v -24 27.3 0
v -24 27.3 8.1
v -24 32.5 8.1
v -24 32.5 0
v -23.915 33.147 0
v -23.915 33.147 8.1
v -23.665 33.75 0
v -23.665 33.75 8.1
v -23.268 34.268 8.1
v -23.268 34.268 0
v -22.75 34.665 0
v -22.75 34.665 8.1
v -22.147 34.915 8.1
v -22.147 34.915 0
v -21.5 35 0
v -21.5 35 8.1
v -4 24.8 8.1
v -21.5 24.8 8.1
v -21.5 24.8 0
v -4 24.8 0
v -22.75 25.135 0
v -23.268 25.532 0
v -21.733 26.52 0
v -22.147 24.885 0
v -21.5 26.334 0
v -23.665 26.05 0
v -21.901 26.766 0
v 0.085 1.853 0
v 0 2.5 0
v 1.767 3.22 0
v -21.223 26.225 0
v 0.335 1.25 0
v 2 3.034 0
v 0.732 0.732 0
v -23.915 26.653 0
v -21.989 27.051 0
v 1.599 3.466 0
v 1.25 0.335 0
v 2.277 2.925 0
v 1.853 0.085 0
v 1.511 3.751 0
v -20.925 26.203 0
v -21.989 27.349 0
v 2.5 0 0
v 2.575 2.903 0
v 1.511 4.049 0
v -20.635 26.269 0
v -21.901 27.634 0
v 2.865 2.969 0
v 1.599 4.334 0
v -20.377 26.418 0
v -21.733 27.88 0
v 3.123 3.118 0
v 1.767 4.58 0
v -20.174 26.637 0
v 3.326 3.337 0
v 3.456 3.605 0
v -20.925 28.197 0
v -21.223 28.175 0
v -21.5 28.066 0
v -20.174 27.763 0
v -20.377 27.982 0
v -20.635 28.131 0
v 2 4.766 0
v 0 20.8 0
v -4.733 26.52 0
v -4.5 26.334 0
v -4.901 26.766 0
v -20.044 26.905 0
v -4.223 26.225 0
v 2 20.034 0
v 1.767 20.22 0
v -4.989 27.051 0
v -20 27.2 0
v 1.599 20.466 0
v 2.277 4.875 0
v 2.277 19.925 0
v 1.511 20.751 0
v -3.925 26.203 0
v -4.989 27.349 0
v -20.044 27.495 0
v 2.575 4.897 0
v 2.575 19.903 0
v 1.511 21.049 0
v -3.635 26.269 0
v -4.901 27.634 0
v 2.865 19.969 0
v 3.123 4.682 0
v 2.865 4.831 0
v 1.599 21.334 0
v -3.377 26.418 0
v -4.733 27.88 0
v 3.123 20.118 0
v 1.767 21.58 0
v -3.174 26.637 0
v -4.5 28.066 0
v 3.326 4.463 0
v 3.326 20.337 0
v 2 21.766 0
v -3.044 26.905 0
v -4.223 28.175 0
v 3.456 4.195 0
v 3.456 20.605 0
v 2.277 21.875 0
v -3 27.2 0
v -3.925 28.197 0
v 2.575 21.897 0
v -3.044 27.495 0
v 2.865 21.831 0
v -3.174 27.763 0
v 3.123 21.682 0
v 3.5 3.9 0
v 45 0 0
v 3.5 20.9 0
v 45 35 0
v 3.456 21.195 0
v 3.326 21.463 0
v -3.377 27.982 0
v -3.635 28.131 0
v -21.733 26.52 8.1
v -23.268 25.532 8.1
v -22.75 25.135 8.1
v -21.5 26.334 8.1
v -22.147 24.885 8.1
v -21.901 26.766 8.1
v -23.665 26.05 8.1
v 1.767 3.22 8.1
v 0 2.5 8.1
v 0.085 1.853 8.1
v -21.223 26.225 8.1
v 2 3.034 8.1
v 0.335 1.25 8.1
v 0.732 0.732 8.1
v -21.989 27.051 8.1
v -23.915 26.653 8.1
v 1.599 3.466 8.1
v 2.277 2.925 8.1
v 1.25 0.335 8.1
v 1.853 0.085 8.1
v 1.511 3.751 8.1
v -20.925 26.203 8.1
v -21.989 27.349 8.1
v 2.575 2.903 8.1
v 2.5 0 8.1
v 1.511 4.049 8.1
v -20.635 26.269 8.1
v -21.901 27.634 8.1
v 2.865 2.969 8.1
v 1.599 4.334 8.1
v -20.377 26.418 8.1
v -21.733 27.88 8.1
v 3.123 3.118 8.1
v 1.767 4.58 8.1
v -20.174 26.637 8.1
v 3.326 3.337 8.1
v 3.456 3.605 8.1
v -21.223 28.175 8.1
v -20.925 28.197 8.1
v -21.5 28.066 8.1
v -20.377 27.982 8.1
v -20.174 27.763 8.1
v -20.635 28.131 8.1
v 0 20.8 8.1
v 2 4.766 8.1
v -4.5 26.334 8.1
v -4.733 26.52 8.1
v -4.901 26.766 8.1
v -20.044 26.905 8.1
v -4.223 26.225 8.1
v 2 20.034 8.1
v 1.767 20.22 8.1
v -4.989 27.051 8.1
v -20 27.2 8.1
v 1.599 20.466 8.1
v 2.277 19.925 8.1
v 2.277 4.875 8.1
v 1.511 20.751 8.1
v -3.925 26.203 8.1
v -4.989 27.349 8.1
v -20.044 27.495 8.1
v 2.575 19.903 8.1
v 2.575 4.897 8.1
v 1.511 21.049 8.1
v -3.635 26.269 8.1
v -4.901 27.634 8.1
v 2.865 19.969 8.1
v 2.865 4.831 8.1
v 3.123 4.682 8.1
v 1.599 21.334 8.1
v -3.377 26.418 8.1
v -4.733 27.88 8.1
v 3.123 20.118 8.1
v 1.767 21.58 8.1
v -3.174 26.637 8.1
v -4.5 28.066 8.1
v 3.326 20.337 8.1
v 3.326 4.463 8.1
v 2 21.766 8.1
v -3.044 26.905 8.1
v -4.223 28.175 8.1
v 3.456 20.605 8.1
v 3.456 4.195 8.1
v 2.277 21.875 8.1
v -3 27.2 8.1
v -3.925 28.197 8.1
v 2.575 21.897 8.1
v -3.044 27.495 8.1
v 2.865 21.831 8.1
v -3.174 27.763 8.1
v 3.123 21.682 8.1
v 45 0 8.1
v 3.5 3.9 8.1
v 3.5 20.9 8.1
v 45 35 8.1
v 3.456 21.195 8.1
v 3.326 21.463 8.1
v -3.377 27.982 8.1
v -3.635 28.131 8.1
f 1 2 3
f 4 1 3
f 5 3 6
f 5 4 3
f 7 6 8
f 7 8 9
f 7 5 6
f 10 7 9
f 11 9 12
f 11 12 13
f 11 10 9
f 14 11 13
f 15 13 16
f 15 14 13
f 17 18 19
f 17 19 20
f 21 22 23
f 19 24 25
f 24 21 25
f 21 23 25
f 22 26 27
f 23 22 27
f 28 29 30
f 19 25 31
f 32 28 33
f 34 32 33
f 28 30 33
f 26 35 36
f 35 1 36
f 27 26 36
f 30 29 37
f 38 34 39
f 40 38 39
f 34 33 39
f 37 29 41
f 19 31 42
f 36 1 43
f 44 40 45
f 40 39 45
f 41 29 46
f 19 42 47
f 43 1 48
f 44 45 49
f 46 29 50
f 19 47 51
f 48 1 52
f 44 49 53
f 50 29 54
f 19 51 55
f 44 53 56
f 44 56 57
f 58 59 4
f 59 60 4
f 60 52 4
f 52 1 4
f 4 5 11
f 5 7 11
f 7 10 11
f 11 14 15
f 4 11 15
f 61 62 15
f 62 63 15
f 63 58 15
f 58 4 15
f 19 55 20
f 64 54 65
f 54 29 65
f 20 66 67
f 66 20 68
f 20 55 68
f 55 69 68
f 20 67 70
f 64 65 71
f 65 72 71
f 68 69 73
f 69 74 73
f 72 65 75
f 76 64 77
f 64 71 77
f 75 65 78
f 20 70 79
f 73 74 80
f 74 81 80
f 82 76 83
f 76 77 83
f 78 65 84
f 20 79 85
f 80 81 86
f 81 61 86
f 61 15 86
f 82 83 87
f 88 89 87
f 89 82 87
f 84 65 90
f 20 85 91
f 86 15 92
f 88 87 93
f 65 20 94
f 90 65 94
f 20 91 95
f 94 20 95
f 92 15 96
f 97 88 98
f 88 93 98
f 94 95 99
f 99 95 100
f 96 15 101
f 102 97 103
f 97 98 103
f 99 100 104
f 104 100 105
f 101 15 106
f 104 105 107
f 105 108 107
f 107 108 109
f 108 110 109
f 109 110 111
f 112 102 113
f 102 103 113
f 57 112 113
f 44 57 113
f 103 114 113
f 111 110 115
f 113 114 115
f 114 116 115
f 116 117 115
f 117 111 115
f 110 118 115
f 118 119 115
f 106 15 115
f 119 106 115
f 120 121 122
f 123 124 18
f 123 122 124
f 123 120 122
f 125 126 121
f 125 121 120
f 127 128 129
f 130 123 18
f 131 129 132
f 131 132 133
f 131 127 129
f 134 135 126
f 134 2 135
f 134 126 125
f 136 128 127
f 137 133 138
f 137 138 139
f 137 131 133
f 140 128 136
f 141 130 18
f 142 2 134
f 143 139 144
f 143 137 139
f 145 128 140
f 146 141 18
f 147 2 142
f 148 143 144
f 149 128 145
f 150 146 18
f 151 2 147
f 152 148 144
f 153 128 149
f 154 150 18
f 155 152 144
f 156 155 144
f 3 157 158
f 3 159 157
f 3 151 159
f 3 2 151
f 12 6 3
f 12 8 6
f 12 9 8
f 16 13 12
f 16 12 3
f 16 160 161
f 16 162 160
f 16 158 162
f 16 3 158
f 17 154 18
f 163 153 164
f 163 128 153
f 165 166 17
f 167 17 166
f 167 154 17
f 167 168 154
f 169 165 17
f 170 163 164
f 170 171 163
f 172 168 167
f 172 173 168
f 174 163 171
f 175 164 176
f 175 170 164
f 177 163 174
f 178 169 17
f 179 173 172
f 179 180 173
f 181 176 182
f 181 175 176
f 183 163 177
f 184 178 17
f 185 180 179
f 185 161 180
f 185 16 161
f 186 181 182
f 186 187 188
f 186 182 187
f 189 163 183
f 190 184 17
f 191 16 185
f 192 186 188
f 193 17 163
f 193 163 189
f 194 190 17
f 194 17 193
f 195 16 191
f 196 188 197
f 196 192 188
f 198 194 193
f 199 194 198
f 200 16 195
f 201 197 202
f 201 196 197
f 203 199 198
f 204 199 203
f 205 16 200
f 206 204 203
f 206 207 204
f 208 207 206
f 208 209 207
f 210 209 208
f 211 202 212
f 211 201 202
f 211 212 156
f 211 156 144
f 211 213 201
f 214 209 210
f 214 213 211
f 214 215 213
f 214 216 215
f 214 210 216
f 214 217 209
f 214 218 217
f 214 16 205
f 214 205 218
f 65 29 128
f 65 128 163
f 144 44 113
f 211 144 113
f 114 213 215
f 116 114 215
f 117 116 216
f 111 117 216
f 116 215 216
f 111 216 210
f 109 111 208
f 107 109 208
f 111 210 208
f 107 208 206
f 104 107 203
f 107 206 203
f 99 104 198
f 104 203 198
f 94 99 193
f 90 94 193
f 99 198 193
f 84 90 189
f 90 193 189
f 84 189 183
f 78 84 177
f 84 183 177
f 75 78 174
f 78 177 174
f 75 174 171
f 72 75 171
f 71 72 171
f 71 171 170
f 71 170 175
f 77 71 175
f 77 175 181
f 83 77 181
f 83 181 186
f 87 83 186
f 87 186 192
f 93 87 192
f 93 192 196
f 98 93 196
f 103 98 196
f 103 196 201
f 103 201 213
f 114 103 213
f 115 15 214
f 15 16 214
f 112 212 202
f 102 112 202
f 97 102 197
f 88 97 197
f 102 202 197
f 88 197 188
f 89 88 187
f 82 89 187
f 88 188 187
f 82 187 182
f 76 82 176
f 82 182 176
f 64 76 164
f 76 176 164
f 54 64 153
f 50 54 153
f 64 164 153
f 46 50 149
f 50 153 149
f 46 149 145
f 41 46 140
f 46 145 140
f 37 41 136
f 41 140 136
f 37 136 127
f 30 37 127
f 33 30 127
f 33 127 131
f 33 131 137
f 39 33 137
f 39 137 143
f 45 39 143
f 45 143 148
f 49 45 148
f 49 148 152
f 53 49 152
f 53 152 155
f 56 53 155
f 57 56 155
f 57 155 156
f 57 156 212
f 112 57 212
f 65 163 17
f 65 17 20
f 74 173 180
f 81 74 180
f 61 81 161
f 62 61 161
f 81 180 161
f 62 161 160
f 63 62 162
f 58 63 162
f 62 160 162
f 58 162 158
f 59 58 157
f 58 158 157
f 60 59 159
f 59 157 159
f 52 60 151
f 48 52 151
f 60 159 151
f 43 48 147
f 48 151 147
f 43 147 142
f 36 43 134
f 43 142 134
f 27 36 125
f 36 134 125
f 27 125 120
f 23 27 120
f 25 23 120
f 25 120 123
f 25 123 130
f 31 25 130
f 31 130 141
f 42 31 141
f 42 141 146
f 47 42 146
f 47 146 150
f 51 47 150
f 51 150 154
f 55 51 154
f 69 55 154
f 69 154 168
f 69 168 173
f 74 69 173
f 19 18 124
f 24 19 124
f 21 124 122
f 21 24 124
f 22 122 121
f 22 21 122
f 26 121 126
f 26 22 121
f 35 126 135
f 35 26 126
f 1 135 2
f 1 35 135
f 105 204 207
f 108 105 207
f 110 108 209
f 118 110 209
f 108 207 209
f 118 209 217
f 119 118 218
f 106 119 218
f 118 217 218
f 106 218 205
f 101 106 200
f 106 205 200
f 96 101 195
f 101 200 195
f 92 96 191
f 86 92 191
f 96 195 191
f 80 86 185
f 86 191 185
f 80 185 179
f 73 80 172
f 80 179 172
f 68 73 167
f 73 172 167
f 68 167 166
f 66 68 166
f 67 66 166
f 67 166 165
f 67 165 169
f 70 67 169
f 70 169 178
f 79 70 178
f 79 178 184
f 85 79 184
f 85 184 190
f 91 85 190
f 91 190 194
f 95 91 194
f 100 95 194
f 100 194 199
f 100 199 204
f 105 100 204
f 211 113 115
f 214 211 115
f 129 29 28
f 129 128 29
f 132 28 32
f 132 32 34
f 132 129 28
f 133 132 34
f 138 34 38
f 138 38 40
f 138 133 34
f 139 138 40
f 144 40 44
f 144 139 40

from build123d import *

# Parameters (mm, degrees)
ESQUISSE1_W             = 45
ESQUISSE1_H             = 35
BOSS_EXTRU_1_DEPTH      = 8.1
ESQUISSE2_W             = 24
ESQUISSE2_H             = 10.2
BOSS_EXTRU_2_DEPTH      = 8.1
ESQUISSE3_R             = 1
ENL_V_MAT_EXTRU_1_DEPTH = 58.581333781
CHANFREIN1_SIZE         = 4
CONG_1_R                = 2.5


with BuildPart() as part:
    # Esquisse1 → Boss.-Extru.1 (new body)
    with BuildSketch(Plane.XY):
        with Locations((22.5, 17.5)):
            Rectangle(ESQUISSE1_W, ESQUISSE1_H)
    extrude(amount=BOSS_EXTRU_1_DEPTH)

    # Esquisse2 → Boss.-Extru.2 (add)
    with BuildSketch(Plane.XY.offset(8.1)):
        with Locations((-12, 29.9)):
            Rectangle(ESQUISSE2_W, ESQUISSE2_H)
    extrude(amount=-BOSS_EXTRU_2_DEPTH)

    # Esquisse3 → Enlèv. mat.-Extru.1 (cut, through all)
    with BuildSketch(Plane.XY.offset(8.1)):
        with Locations((-4, 27.2)):
            Circle(ESQUISSE3_R)
        with Locations((-21, 27.2)):
            Circle(ESQUISSE3_R)
        with Locations((2.5, 20.9)):
            Circle(ESQUISSE3_R)
        with Locations((2.5, 3.9)):
            Circle(ESQUISSE3_R)
    extrude(amount=-ENL_V_MAT_EXTRU_1_DEPTH, mode=Mode.SUBTRACT)

    # Chanfrein1
    chanfrein1_edges = [part.edges().sort_by_distance(p)[0] for p in [
        (0, 24.8, 4.05),
    ]]
    chamfer(chanfrein1_edges, length=CHANFREIN1_SIZE)

    # Congé1
    cong_1_edges = [part.edges().sort_by_distance(p)[0] for p in [
        (-24, 24.8, 4.05),
        (-24, 35, 4.05),
        (0, 0, 4.05),
    ]]
    fillet(cong_1_edges, radius=CONG_1_R)


solid = part.part
